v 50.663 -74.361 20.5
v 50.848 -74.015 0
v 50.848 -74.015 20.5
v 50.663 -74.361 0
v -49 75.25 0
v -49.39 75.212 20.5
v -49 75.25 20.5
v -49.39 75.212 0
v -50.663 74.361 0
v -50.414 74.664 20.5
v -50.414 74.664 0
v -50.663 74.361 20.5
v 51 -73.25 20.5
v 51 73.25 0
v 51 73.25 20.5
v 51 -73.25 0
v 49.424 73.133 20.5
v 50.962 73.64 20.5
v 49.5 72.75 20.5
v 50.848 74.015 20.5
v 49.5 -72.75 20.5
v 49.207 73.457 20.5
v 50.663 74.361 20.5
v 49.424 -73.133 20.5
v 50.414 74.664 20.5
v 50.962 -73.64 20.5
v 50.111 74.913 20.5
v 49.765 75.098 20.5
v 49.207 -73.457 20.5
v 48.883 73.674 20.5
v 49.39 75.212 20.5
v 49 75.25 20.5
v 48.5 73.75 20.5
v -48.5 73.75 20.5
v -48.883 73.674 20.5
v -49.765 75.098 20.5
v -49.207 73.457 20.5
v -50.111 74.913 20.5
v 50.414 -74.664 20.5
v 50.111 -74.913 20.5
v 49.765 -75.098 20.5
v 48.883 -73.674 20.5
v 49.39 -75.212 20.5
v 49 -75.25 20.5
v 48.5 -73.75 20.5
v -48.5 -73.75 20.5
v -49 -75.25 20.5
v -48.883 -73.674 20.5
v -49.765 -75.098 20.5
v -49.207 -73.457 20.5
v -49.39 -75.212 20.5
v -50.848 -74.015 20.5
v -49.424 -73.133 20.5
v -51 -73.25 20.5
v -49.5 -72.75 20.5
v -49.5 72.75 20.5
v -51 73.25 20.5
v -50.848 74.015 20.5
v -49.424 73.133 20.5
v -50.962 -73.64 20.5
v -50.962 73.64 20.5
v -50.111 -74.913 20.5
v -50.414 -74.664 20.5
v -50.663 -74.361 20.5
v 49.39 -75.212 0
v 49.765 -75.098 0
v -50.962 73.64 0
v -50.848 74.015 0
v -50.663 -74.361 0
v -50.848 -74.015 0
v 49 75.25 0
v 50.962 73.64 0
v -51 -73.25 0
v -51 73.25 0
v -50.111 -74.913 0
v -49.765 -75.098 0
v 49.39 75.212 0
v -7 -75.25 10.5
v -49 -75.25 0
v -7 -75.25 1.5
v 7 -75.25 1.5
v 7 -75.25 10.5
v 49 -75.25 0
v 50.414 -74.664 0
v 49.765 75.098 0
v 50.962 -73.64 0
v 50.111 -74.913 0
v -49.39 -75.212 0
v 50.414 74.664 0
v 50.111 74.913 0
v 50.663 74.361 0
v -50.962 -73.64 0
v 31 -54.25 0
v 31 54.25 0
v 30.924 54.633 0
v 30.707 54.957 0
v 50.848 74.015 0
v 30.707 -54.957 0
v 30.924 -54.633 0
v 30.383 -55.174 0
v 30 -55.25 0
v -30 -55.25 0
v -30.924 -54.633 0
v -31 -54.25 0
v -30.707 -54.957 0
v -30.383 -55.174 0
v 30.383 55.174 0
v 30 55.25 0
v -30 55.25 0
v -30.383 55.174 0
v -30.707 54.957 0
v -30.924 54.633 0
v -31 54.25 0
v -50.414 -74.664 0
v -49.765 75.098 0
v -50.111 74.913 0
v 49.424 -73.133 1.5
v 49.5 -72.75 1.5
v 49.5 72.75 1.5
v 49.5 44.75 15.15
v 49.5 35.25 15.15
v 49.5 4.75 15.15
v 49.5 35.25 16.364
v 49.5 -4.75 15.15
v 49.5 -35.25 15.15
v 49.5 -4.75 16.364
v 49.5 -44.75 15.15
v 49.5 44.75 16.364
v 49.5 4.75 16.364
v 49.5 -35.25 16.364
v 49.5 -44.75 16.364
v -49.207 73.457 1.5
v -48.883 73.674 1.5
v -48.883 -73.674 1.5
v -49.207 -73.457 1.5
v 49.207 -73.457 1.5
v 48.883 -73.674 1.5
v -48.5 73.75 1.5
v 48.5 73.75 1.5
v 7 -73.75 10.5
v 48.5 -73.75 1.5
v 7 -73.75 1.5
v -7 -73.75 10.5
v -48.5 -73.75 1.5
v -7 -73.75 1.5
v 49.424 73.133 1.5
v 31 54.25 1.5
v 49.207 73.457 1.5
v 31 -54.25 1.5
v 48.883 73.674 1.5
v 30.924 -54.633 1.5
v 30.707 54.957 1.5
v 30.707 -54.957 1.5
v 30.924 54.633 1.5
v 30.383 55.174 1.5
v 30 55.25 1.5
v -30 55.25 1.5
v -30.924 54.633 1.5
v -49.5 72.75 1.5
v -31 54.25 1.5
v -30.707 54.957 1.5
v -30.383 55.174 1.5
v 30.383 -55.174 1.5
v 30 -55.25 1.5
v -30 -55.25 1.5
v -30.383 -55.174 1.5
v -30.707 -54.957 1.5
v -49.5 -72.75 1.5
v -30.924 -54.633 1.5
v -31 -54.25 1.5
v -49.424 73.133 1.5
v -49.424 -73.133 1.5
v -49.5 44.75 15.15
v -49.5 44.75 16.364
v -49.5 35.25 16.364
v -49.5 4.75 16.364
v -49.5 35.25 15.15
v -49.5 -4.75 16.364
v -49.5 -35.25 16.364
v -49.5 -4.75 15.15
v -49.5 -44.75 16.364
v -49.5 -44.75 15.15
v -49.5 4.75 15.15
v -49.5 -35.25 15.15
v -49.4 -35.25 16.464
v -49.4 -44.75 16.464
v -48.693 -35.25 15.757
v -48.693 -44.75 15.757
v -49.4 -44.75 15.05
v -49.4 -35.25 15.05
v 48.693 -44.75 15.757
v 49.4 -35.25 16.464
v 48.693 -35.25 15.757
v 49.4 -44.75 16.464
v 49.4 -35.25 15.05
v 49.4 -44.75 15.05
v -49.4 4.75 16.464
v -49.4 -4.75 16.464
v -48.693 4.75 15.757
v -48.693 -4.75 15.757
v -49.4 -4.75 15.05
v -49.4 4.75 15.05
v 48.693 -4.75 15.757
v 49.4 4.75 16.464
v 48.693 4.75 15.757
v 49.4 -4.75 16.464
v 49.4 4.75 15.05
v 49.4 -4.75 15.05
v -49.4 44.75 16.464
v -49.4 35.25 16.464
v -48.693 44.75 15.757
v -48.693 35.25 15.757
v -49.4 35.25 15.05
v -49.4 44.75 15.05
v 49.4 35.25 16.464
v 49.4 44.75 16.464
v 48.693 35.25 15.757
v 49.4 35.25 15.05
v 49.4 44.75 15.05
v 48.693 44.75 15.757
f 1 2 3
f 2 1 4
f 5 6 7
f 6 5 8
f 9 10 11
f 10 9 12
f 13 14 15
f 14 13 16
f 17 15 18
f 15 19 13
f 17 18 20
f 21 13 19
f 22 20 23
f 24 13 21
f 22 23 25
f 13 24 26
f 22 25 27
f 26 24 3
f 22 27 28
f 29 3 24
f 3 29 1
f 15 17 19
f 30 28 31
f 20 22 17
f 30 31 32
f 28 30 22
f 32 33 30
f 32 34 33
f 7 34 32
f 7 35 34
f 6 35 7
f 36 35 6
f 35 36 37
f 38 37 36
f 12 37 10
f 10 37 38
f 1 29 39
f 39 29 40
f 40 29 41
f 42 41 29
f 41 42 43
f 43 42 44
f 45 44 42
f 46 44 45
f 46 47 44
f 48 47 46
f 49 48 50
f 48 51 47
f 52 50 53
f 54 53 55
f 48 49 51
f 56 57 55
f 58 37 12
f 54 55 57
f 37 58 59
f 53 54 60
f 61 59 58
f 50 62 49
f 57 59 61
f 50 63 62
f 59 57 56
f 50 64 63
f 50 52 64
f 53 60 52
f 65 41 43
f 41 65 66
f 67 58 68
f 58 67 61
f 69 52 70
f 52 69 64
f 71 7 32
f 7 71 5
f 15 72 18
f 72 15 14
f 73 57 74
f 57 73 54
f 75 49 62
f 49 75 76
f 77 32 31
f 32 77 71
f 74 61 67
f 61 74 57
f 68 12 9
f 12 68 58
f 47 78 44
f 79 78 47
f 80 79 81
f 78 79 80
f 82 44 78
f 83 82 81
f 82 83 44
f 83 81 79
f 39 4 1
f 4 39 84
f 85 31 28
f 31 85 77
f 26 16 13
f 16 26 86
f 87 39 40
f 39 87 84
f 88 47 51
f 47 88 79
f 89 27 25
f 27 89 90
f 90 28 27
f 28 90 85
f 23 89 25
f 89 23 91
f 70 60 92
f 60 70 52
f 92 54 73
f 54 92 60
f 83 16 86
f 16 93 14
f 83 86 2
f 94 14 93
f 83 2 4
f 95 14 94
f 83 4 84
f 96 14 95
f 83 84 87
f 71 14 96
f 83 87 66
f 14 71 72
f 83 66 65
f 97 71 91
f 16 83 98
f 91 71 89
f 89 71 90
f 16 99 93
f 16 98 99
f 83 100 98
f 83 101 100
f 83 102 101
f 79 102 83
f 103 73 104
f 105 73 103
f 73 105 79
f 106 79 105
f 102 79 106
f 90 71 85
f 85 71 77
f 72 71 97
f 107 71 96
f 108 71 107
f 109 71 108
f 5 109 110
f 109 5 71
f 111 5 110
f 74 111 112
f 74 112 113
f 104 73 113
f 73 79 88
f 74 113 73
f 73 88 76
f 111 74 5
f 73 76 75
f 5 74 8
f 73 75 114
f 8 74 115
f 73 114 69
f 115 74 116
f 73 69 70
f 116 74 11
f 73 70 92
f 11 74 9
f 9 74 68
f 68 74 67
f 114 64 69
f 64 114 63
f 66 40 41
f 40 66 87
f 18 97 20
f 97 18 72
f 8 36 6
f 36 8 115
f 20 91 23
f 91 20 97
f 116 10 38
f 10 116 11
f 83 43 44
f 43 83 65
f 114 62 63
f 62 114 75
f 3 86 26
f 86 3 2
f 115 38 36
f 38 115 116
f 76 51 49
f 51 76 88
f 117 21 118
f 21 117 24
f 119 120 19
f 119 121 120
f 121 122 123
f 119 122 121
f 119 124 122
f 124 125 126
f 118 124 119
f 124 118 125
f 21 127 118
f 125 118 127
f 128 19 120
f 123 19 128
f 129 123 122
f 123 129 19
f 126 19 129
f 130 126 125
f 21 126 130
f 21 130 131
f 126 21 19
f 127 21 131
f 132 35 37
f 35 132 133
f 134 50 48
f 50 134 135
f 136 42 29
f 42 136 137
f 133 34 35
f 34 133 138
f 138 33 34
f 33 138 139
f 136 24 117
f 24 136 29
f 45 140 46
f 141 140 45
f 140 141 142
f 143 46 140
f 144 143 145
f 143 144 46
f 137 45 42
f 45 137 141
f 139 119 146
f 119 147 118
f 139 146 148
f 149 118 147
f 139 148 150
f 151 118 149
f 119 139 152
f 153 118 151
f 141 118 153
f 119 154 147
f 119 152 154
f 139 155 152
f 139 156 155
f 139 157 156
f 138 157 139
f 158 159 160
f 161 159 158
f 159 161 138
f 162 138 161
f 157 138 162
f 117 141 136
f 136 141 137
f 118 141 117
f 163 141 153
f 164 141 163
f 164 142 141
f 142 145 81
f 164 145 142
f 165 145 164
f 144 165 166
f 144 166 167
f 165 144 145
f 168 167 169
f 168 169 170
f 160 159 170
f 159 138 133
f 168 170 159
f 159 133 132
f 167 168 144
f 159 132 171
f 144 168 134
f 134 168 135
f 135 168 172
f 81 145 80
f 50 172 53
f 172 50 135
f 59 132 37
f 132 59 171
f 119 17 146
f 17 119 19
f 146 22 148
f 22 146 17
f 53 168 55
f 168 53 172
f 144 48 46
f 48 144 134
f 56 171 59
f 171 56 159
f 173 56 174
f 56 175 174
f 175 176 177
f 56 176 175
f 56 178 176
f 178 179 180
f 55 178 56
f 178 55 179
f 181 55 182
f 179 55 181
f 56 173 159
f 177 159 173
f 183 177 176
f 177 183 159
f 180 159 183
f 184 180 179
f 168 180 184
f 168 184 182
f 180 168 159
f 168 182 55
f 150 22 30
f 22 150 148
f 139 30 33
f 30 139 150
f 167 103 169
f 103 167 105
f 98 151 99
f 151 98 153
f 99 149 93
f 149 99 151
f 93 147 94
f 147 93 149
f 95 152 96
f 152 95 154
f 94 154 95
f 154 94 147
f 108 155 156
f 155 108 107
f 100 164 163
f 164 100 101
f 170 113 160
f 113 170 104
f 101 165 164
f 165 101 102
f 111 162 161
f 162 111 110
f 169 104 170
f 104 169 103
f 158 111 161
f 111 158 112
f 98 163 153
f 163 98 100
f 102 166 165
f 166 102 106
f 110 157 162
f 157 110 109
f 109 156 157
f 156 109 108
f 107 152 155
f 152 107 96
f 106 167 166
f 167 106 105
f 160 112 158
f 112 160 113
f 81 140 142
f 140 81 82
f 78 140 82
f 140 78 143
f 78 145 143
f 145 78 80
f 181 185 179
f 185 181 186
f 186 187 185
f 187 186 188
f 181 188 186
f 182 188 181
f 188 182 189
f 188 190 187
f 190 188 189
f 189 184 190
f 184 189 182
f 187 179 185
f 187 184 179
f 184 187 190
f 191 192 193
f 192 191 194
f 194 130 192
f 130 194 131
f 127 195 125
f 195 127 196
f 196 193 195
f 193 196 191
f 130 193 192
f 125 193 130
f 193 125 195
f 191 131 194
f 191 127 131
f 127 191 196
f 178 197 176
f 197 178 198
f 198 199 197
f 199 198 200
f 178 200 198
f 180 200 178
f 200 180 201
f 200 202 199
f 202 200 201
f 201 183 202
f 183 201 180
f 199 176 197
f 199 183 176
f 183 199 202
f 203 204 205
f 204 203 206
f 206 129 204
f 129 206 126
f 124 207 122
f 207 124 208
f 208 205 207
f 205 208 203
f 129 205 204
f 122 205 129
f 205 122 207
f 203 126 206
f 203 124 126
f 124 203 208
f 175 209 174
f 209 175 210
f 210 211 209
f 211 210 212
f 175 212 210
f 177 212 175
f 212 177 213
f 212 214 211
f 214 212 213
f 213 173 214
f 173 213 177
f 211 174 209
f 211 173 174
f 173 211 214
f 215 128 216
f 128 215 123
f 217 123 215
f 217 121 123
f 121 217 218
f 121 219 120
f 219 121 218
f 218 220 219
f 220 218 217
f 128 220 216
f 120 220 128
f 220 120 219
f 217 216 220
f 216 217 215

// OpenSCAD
screen_w = 62;
screen_h = 110.5;
phone_w = 69.64;
phone_h = 143.83;
phone_t = 7.5;

W = screen_w + 40;
H = screen_h + 40;
T = phone_t + 1.5 + 1.5 + 1+5+4;

difference() {
    cube_center([W,H,T],r=2,$fn=32);
    translate([0,0,1.5])
    cube_center([W-3,H-3,T],r=1);
    translate([0,0,-1])
    cube_center([screen_w, screen_h, 15],r=1);
    translate([0,-100,1.5])
    cube_center([14,200,9]);  
}

    for(s=[-1,0,1]) for(t=[-1,1])
    translate([t*(W/2-1.6),s*40,5+phone_t+1+1.5+sqrt(2)/2+.05])
    rotate([90,0,0])
    cylinder(d=1.4142,h=9.5,$fn=4, center=true);


/*
for(s=[-1,1])
translate([s*43,70,0])
rotate([0,0,90])
    hanger();
*/

module cube_center(dims,r=0,$fn=16) {
    if(r==0) {
        translate([-dims[0]/2, -dims[1]/2, 0])
        cube(dims);
    } else {
        minkowski() {
            translate([-(dims[0]-2*r)/2, -(dims[1]-2*r)/2, 0])
            cube([dims[0]-2*r,dims[1]-2*r,dims[2]]);
            cylinder(r=r,$fn=$fn,h=0.0001);
        }
    }
}

module hanger() {
    rotate([0,0,-90]) {
    linear_extrude(8)
    minkowski() {
        polygon([[0,2],[-5,-8],[0,1],[5,-8]]);
        circle(r=1);
    }
    translate([0,0,8])
    linear_extrude(1)
    minkowski() {
        polygon([[0,2],[-5,-8],[0,-5],[5,-8]]);
        circle(r=1);
    }
}
}
